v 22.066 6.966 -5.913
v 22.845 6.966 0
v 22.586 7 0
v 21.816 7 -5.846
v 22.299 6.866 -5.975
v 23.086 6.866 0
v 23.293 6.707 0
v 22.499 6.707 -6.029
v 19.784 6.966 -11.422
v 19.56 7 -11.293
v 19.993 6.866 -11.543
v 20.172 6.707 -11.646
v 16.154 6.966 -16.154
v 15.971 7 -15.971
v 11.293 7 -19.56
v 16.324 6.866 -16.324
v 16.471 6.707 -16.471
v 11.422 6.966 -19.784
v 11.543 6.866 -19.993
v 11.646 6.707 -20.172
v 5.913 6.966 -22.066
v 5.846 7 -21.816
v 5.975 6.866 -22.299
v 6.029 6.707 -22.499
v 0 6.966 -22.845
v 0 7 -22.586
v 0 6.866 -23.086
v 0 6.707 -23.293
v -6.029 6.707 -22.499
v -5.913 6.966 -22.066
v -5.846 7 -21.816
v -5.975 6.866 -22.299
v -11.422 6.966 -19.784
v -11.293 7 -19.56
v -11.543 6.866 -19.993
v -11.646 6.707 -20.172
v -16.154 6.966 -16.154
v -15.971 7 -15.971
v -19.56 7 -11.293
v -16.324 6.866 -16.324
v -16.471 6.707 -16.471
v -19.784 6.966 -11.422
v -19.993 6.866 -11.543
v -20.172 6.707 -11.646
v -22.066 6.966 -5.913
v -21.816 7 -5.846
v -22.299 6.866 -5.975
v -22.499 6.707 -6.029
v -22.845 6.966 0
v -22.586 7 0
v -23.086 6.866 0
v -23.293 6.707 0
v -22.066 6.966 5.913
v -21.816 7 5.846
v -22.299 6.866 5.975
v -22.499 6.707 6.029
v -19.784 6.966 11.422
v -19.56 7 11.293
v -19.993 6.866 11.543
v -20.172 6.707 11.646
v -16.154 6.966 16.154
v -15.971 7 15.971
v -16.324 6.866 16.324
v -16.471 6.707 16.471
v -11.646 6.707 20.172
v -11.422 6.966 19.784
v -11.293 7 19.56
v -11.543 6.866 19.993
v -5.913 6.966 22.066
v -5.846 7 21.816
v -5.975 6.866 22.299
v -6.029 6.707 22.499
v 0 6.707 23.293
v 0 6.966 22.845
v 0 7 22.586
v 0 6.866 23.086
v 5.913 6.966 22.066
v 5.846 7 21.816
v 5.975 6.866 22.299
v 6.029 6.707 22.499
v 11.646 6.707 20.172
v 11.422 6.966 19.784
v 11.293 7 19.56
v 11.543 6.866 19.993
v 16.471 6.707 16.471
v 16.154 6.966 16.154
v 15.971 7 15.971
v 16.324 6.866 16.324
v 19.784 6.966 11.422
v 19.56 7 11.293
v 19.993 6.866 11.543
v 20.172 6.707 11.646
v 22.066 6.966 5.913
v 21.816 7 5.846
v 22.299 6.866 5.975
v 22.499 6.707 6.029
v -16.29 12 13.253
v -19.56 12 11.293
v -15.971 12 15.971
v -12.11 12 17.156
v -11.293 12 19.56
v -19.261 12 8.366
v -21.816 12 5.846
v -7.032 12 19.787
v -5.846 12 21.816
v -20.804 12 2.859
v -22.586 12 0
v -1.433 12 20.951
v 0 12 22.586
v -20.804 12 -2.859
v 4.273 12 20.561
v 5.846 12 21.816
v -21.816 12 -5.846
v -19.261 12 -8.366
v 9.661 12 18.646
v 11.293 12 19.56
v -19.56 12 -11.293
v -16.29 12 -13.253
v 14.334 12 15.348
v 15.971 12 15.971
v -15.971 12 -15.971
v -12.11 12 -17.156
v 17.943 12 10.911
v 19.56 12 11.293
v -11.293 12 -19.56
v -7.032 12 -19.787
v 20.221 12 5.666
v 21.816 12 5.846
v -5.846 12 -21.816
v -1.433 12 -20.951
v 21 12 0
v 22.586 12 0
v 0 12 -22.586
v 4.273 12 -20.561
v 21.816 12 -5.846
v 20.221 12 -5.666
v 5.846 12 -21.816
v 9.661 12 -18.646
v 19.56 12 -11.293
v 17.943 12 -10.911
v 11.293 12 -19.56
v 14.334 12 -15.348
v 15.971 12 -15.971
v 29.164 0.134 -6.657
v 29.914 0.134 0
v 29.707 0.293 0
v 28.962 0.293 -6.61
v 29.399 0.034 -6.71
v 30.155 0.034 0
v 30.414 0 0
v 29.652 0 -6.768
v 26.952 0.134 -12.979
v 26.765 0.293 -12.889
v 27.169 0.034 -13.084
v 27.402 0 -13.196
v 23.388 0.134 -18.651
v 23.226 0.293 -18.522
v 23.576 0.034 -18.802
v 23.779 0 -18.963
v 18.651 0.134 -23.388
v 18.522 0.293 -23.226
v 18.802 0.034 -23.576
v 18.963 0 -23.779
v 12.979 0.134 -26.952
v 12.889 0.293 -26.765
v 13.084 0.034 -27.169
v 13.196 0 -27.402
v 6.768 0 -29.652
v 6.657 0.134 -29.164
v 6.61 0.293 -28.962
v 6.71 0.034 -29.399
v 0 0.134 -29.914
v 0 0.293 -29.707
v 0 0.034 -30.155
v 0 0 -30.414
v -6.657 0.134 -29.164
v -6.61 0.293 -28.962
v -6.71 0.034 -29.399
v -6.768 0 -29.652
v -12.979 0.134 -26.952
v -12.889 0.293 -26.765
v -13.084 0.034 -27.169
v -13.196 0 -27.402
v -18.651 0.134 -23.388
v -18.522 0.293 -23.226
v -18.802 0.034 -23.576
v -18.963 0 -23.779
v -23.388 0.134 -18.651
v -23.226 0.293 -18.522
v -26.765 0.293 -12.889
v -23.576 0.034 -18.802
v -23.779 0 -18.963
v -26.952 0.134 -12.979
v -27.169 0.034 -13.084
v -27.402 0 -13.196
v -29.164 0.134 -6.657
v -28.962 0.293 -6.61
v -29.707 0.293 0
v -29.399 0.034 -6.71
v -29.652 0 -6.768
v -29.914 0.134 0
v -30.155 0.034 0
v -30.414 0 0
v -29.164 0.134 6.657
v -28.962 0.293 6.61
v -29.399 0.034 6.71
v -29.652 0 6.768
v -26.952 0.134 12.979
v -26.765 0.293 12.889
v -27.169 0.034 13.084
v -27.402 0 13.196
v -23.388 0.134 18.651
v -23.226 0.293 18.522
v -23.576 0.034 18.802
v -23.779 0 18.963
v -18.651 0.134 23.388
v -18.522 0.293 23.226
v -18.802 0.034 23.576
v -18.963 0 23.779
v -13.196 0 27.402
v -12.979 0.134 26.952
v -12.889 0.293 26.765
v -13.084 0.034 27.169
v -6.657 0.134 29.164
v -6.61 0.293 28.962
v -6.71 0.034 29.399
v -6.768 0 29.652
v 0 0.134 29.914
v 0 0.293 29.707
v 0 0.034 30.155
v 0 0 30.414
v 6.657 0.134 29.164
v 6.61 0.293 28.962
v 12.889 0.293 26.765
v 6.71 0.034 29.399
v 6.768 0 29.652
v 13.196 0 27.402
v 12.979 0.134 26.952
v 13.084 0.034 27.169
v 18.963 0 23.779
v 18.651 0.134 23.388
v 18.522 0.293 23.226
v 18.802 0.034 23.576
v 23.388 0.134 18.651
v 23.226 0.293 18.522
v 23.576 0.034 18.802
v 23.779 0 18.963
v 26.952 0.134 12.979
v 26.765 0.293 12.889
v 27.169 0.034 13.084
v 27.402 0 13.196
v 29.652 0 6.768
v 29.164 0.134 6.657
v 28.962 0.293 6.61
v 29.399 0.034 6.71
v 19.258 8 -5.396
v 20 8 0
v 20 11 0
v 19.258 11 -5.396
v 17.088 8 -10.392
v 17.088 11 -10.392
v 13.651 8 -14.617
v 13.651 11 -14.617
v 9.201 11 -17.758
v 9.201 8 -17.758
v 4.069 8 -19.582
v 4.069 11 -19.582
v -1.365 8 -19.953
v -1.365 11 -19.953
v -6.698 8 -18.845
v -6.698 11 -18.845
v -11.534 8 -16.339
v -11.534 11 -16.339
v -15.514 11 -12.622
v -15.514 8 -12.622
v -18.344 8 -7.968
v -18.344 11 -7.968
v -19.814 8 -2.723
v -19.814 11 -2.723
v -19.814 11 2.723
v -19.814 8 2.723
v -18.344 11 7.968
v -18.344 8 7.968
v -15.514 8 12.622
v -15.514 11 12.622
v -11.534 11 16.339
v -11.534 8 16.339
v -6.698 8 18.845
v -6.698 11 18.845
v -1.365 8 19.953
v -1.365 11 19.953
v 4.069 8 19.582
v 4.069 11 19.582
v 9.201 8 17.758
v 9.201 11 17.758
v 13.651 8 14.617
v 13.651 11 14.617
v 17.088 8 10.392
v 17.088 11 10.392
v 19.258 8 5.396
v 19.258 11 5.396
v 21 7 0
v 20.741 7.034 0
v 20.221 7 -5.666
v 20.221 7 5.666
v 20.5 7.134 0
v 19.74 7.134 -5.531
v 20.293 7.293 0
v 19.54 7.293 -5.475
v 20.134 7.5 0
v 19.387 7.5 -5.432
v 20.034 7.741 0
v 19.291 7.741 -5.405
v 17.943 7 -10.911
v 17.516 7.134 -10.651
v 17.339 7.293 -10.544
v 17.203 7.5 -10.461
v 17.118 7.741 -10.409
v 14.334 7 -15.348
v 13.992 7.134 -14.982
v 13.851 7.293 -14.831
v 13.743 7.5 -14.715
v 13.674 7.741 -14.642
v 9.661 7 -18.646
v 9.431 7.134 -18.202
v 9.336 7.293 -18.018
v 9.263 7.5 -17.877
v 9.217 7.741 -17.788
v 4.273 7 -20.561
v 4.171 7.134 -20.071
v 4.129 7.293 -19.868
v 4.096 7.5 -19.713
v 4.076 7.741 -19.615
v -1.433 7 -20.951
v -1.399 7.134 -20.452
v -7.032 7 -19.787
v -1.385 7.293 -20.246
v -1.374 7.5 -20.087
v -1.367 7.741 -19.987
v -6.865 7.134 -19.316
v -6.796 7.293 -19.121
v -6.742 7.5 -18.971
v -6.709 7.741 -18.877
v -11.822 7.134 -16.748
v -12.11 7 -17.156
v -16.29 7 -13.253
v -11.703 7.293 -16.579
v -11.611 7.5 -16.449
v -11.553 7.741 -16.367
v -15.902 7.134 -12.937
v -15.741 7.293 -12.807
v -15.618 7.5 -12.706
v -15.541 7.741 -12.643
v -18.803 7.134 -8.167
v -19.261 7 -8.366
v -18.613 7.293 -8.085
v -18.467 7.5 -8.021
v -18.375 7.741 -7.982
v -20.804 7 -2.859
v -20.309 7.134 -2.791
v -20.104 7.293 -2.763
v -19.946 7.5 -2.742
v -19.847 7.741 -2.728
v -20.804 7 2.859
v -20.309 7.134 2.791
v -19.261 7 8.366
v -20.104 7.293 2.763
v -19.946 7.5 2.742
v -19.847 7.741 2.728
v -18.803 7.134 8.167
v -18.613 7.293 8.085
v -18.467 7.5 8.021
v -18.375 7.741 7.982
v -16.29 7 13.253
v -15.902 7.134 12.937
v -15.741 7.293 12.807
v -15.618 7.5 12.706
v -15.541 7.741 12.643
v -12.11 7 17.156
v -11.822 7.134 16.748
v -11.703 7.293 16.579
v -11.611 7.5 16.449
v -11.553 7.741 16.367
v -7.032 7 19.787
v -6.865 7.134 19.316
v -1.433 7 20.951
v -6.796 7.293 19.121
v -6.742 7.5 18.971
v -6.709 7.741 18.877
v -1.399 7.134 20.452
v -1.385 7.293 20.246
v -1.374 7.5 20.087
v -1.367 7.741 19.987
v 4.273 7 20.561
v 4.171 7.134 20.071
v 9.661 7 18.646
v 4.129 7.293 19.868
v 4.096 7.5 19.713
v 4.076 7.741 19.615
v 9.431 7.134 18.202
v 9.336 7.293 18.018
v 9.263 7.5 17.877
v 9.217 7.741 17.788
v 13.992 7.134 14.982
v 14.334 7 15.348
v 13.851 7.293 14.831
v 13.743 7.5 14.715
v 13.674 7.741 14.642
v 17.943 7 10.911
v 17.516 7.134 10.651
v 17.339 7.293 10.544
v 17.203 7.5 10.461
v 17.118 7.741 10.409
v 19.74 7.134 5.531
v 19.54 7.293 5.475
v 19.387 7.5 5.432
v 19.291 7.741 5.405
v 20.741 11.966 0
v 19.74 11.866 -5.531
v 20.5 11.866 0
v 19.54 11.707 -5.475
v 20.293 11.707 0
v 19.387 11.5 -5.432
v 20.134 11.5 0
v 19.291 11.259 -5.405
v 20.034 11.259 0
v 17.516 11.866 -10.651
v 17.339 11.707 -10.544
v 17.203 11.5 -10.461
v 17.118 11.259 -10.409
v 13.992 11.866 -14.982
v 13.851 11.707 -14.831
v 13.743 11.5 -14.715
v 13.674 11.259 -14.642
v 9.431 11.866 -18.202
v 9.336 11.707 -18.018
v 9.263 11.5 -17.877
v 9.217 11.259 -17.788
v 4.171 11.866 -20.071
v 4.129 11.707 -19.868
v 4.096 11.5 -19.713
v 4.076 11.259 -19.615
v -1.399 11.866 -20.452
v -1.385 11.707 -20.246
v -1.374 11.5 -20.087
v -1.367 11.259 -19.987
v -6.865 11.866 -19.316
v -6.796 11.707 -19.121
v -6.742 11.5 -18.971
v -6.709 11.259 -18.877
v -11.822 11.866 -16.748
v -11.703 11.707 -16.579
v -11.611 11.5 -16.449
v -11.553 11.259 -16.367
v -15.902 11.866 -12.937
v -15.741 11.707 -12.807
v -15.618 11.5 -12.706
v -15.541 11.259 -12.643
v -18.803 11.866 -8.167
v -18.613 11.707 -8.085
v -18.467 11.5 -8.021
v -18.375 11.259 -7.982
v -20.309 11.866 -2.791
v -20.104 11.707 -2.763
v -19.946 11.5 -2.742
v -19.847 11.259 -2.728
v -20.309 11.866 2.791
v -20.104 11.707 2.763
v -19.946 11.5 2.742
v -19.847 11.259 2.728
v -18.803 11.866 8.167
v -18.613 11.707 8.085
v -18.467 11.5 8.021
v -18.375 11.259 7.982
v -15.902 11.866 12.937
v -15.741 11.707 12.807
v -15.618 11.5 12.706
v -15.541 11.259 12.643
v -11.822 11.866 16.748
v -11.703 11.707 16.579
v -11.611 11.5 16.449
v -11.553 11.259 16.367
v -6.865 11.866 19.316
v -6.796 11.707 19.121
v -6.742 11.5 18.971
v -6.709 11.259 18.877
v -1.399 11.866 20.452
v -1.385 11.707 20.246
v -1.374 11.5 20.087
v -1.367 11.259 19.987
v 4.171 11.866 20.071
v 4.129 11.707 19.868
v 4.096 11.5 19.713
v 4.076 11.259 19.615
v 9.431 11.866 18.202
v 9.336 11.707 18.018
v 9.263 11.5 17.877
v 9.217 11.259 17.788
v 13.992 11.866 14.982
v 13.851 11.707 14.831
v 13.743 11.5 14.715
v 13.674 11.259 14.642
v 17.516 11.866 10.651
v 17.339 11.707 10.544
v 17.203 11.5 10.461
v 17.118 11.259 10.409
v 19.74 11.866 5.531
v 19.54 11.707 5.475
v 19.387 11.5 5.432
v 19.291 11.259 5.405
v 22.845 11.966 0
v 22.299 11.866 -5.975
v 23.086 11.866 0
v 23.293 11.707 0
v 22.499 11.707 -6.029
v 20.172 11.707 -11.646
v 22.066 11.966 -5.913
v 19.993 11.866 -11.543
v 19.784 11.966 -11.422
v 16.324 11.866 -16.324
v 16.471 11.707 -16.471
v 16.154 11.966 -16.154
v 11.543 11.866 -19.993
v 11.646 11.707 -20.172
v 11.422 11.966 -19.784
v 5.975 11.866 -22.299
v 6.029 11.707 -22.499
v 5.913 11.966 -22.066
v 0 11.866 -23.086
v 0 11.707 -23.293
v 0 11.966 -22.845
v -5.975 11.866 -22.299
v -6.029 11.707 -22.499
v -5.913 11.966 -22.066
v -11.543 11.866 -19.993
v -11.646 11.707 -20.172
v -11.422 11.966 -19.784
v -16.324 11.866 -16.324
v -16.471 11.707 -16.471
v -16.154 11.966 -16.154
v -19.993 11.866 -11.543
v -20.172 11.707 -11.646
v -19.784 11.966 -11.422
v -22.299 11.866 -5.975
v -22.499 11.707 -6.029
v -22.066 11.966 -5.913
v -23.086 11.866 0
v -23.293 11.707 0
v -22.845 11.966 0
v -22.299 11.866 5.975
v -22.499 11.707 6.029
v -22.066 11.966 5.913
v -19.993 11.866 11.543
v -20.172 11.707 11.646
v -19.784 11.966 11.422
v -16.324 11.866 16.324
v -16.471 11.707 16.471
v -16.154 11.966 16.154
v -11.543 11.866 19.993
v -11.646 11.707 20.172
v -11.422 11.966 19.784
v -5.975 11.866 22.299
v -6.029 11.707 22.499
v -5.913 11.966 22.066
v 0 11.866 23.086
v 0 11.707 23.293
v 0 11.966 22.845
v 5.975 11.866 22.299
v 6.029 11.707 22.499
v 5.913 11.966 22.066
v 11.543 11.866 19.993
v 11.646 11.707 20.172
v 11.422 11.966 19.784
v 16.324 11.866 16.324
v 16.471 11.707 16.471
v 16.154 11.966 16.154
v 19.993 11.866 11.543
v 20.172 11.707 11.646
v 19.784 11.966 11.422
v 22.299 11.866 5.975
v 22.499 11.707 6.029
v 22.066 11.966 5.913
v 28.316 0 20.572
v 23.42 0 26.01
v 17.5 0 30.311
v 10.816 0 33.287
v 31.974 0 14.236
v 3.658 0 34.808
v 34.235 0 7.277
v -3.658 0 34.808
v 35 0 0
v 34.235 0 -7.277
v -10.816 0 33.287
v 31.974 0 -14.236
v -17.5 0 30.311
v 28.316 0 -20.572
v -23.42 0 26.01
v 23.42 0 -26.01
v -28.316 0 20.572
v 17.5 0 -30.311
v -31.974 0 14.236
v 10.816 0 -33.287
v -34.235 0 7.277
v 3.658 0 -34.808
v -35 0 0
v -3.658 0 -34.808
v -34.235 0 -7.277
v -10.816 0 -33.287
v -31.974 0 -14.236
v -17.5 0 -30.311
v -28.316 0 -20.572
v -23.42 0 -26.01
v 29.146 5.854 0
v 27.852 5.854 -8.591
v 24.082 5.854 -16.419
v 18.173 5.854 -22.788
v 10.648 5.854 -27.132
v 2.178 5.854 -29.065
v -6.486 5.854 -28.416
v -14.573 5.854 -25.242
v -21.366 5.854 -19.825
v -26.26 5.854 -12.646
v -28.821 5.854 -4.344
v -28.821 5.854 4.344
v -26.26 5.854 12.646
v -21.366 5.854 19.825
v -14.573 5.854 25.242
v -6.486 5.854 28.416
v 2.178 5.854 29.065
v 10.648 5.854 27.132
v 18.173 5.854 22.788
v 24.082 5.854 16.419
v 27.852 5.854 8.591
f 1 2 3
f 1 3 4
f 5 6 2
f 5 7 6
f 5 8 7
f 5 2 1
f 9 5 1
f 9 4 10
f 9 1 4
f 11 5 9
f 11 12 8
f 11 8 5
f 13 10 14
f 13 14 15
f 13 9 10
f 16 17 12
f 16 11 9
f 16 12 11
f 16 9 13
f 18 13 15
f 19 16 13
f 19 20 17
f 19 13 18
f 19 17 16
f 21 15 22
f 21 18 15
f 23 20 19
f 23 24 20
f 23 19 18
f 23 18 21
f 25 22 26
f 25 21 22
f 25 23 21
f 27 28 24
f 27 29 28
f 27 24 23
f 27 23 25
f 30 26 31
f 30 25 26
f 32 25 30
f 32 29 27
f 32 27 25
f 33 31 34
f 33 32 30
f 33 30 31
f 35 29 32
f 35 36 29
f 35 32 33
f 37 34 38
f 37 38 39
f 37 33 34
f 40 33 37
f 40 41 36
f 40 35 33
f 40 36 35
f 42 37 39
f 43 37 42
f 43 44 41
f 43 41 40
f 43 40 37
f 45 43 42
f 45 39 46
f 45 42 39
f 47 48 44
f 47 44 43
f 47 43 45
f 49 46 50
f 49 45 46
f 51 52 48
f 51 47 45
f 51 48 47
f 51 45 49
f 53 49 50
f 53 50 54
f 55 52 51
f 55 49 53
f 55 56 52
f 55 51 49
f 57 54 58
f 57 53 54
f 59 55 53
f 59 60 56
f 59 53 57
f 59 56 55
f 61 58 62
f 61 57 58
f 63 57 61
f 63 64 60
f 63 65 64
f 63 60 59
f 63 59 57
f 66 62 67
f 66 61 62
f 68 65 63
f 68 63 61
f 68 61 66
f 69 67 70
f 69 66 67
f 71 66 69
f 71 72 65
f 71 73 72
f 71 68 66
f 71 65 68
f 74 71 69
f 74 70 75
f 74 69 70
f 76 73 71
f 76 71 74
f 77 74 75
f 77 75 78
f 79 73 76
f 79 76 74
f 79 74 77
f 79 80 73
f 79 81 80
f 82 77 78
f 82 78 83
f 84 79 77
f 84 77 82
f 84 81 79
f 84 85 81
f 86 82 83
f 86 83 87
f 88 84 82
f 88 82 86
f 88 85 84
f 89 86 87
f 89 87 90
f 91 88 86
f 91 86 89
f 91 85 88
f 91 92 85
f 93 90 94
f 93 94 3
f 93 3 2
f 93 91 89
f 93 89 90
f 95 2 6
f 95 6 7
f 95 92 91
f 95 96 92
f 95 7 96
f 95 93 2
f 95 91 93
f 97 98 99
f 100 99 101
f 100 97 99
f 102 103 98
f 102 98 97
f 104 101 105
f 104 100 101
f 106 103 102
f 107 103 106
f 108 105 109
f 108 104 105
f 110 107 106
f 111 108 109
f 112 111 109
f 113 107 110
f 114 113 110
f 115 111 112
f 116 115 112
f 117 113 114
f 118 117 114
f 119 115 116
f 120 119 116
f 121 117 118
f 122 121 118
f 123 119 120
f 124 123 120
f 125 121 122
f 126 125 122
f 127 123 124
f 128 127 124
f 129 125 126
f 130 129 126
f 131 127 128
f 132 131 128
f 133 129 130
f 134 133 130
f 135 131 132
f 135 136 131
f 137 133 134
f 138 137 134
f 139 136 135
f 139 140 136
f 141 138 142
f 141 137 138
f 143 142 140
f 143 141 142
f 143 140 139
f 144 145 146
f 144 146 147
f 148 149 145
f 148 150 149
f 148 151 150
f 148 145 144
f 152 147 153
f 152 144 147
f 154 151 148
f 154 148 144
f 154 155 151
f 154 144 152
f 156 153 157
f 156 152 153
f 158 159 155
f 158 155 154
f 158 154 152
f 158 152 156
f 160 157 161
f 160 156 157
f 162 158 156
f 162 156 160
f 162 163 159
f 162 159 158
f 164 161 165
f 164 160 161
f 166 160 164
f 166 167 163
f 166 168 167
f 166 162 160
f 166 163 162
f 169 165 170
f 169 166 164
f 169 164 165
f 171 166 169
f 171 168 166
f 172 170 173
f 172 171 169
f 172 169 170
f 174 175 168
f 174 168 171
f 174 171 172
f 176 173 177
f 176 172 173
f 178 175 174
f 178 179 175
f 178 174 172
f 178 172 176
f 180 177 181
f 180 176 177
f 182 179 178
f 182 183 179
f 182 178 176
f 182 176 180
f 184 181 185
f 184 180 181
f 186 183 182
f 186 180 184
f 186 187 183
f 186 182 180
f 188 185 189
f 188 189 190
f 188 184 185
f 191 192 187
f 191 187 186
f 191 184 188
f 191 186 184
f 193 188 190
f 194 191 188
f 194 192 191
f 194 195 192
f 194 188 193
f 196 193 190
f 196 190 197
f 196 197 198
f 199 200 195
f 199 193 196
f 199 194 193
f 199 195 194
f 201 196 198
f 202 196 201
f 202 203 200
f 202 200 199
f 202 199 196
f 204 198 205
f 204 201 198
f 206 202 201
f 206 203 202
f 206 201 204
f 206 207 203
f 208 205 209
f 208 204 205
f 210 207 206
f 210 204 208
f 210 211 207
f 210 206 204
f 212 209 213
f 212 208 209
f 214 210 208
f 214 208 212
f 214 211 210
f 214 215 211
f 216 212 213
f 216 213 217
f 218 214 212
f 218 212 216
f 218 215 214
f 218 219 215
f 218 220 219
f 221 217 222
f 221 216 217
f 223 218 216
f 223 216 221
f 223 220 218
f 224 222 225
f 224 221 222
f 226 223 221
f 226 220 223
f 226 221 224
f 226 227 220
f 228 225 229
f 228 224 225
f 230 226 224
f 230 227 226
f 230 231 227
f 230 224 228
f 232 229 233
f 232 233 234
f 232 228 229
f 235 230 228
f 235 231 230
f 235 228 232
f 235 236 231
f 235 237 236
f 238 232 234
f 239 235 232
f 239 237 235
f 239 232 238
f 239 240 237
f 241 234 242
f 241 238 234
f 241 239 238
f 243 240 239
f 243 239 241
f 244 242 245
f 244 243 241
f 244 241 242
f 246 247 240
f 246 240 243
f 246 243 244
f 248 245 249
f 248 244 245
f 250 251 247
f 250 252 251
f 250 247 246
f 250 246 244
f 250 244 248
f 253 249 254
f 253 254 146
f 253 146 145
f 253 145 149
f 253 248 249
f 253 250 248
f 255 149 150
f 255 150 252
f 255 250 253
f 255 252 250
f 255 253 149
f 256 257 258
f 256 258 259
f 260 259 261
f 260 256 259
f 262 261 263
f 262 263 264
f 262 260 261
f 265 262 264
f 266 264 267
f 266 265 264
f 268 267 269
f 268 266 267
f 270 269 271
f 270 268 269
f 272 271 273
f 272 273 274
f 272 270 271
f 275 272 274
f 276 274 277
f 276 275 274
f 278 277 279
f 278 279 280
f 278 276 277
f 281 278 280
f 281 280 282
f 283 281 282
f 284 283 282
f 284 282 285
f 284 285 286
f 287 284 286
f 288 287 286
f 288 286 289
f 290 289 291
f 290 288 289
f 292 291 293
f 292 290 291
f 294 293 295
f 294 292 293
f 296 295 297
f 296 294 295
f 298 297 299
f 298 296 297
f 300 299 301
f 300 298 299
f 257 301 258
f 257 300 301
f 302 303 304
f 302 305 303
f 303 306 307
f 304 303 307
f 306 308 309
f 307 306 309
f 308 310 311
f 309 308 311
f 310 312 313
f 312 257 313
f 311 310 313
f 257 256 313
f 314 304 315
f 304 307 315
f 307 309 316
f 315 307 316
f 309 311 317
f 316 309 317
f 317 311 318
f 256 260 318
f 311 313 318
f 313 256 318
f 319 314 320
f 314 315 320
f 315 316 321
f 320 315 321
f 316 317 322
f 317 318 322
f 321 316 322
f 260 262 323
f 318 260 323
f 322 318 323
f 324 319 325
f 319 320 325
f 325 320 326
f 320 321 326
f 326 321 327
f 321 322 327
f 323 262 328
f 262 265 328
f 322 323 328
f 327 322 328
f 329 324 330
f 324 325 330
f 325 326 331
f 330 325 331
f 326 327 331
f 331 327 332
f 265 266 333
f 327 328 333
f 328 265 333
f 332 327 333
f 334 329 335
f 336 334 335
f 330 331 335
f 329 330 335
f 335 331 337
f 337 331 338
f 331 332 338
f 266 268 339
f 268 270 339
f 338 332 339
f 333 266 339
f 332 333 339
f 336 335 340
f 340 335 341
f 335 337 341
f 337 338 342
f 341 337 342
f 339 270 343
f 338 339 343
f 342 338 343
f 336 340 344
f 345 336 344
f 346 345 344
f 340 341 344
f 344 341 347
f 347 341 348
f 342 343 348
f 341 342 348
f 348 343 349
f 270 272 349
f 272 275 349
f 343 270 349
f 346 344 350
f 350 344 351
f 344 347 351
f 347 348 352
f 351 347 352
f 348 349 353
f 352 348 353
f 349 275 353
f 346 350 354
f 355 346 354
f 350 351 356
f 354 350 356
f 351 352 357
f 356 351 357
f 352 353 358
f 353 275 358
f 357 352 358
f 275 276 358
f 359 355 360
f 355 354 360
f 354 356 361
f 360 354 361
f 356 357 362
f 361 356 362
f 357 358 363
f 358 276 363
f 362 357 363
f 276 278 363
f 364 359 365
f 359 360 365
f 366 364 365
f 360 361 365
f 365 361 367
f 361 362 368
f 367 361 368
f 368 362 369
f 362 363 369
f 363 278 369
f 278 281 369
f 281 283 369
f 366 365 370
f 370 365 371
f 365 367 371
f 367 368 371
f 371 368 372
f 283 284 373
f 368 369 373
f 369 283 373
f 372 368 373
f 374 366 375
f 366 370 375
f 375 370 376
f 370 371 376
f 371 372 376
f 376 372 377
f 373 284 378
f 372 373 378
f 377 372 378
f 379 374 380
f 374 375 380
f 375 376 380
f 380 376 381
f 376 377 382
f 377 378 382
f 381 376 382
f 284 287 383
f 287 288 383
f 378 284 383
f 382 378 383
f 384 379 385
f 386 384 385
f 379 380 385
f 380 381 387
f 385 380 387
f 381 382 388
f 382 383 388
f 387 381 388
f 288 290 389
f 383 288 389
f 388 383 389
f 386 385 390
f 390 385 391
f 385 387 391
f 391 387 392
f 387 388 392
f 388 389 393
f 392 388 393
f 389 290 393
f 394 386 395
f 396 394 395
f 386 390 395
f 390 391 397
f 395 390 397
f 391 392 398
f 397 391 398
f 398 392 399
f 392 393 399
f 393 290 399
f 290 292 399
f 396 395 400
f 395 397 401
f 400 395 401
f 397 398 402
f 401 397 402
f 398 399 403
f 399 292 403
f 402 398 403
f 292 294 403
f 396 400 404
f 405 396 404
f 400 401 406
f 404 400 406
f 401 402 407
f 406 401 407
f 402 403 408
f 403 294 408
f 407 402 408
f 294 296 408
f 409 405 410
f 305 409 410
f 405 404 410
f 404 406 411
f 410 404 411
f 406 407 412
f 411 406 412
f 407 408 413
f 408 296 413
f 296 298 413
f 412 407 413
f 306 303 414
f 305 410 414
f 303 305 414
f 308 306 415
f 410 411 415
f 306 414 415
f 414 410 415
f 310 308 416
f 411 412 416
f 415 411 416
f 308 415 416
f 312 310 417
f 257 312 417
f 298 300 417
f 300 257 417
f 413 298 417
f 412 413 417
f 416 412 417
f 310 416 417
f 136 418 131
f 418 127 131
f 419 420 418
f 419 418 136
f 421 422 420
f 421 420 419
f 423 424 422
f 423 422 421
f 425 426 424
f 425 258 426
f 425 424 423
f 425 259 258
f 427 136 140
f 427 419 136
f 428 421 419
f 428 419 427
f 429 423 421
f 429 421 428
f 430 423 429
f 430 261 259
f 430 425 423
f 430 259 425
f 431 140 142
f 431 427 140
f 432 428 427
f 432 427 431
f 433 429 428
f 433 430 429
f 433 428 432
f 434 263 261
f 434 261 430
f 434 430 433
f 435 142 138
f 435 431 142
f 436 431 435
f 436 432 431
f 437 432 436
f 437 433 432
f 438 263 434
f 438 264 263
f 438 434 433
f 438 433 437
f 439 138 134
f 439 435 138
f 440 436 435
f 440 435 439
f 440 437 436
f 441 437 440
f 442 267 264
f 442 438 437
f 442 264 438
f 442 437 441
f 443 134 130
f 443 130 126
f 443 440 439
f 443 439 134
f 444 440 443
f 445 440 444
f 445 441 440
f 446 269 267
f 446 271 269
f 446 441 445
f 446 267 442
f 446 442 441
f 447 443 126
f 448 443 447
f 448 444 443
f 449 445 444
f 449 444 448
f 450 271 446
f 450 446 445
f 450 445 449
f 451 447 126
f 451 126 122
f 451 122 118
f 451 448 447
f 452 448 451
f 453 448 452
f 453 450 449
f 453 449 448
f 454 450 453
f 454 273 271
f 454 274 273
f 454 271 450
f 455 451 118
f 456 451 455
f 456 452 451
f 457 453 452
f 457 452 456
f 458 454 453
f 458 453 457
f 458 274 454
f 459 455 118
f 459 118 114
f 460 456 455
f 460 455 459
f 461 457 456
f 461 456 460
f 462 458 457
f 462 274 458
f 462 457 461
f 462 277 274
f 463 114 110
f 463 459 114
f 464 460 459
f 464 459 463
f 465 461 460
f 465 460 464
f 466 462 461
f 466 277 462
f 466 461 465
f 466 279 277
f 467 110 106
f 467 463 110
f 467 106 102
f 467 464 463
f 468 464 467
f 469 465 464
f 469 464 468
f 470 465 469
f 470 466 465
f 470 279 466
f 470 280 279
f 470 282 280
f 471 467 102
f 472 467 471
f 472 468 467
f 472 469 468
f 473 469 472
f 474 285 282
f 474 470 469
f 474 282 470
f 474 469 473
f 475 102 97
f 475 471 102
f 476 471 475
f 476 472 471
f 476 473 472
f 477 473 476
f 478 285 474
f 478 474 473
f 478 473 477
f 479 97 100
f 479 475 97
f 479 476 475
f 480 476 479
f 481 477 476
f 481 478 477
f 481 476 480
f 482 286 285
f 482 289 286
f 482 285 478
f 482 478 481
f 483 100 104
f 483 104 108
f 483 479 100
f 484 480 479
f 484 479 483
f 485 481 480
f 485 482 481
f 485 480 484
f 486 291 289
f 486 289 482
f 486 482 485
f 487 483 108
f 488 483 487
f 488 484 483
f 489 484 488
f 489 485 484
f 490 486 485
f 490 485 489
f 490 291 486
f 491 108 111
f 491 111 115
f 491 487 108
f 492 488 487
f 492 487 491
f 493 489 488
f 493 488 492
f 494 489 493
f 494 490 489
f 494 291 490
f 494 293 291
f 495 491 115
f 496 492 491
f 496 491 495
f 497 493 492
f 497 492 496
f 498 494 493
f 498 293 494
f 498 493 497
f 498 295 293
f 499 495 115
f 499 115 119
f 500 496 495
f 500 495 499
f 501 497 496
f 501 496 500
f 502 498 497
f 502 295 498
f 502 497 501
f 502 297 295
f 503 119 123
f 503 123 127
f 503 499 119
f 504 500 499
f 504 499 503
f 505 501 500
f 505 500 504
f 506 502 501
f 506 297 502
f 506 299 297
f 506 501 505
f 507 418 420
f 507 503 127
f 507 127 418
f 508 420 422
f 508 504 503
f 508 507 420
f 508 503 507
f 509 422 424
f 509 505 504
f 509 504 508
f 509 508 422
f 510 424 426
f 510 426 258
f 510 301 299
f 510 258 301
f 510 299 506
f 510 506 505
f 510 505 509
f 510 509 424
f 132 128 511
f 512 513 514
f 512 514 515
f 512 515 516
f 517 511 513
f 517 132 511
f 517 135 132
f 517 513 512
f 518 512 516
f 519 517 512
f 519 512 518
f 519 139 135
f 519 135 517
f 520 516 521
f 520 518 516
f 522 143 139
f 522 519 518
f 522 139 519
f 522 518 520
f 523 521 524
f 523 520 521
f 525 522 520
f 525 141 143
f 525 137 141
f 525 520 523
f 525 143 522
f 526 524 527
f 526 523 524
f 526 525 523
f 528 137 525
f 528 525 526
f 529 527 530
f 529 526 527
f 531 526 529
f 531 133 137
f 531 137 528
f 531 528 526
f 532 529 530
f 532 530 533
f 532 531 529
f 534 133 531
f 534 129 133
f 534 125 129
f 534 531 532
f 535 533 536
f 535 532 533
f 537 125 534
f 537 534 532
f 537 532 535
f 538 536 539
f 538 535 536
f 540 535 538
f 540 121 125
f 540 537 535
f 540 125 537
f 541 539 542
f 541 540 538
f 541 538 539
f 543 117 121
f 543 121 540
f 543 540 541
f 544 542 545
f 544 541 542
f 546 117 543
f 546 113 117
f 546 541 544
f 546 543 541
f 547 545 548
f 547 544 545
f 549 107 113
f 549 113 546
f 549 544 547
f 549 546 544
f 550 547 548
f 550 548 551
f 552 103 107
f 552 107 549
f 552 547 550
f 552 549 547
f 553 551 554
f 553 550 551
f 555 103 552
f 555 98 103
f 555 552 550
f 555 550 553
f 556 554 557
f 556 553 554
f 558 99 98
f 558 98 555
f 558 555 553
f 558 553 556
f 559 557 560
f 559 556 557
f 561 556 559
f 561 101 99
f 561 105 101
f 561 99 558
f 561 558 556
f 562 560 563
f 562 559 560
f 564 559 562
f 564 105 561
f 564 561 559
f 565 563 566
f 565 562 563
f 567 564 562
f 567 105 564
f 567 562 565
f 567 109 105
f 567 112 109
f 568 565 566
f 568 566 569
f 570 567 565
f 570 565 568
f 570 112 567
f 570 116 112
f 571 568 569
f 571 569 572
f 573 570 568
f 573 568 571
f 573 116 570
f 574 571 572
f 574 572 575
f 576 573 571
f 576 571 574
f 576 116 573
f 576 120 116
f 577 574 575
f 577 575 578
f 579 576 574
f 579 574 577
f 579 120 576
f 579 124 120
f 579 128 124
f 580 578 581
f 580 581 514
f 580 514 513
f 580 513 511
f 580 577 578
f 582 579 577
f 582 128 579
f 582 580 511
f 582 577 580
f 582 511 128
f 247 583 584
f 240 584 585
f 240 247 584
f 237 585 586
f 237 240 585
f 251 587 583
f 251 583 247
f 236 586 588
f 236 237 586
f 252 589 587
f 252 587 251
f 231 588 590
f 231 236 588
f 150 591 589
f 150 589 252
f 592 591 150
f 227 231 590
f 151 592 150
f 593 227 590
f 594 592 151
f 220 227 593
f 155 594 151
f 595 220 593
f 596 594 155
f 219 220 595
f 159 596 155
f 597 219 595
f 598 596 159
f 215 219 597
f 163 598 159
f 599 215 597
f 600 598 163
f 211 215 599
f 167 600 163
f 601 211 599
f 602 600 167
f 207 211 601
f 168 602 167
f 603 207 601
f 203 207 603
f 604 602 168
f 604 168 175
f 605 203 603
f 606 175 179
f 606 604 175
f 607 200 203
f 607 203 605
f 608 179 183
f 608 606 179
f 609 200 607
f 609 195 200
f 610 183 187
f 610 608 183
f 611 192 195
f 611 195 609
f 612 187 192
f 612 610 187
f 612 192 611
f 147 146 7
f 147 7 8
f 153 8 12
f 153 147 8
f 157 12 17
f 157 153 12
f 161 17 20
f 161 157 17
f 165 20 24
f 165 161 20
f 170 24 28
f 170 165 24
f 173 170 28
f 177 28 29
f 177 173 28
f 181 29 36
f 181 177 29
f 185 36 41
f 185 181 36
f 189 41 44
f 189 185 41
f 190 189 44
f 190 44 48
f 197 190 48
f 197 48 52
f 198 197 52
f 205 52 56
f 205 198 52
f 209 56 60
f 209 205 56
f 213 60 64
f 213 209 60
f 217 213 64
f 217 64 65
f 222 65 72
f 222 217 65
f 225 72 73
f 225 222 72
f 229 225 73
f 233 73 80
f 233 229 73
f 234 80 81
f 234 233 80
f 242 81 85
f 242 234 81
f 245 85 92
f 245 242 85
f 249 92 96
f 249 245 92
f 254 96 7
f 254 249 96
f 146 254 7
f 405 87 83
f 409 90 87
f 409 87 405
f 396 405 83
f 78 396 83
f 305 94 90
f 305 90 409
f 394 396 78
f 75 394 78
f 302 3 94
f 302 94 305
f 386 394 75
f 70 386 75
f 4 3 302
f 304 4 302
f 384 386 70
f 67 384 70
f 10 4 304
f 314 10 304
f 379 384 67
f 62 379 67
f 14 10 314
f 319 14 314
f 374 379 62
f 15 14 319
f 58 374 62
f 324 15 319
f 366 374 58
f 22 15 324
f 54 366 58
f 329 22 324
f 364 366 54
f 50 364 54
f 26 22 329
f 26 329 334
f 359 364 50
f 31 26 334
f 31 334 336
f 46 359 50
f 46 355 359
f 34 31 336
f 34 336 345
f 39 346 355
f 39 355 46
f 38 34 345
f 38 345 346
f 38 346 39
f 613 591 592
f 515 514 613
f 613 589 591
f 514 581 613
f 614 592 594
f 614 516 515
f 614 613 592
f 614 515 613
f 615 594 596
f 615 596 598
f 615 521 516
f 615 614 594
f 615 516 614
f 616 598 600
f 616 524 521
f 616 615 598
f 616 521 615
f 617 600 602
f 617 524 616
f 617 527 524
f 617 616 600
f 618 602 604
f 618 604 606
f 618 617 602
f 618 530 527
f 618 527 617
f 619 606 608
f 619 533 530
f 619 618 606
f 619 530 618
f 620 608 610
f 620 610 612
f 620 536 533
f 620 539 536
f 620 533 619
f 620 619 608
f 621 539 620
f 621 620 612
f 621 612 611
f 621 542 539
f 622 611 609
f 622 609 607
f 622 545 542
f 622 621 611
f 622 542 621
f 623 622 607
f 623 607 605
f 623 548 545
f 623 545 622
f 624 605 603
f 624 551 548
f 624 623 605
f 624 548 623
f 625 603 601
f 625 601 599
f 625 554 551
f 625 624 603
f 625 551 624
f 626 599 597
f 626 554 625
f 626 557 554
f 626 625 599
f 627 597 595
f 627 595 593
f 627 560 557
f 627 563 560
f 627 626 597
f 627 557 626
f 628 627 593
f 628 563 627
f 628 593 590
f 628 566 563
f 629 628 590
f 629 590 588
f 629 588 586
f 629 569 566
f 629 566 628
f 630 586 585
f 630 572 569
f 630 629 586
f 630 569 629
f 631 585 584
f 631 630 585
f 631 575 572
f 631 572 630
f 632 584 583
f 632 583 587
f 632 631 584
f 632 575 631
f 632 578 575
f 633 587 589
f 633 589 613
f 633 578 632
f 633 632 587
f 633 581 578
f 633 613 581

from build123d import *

# Parameters (mm, degrees)
FILLET_R = 1


with BuildPart() as part:
    # Sketch → Revolution (revolve)
    with BuildSketch(Plane.XY):
        Polygon((20, 7), (23, 7), (30, 0), (35, 0), (23, 12), (20, 12), align=None)
    revolve(axis=Axis((0, 0, 0), (0, 1, 0)))

    # Fillet
    fillet_edges = [part.edges().sort_by_distance(p)[0] for p in [
        (-30, 0, 0),
        (-23, 7, 0),
        (-20, 7, 0),
        (-23, 12, 0),
        (-20, 12, 0),
    ]]
    fillet(fillet_edges, radius=FILLET_R)


solid = part.part
